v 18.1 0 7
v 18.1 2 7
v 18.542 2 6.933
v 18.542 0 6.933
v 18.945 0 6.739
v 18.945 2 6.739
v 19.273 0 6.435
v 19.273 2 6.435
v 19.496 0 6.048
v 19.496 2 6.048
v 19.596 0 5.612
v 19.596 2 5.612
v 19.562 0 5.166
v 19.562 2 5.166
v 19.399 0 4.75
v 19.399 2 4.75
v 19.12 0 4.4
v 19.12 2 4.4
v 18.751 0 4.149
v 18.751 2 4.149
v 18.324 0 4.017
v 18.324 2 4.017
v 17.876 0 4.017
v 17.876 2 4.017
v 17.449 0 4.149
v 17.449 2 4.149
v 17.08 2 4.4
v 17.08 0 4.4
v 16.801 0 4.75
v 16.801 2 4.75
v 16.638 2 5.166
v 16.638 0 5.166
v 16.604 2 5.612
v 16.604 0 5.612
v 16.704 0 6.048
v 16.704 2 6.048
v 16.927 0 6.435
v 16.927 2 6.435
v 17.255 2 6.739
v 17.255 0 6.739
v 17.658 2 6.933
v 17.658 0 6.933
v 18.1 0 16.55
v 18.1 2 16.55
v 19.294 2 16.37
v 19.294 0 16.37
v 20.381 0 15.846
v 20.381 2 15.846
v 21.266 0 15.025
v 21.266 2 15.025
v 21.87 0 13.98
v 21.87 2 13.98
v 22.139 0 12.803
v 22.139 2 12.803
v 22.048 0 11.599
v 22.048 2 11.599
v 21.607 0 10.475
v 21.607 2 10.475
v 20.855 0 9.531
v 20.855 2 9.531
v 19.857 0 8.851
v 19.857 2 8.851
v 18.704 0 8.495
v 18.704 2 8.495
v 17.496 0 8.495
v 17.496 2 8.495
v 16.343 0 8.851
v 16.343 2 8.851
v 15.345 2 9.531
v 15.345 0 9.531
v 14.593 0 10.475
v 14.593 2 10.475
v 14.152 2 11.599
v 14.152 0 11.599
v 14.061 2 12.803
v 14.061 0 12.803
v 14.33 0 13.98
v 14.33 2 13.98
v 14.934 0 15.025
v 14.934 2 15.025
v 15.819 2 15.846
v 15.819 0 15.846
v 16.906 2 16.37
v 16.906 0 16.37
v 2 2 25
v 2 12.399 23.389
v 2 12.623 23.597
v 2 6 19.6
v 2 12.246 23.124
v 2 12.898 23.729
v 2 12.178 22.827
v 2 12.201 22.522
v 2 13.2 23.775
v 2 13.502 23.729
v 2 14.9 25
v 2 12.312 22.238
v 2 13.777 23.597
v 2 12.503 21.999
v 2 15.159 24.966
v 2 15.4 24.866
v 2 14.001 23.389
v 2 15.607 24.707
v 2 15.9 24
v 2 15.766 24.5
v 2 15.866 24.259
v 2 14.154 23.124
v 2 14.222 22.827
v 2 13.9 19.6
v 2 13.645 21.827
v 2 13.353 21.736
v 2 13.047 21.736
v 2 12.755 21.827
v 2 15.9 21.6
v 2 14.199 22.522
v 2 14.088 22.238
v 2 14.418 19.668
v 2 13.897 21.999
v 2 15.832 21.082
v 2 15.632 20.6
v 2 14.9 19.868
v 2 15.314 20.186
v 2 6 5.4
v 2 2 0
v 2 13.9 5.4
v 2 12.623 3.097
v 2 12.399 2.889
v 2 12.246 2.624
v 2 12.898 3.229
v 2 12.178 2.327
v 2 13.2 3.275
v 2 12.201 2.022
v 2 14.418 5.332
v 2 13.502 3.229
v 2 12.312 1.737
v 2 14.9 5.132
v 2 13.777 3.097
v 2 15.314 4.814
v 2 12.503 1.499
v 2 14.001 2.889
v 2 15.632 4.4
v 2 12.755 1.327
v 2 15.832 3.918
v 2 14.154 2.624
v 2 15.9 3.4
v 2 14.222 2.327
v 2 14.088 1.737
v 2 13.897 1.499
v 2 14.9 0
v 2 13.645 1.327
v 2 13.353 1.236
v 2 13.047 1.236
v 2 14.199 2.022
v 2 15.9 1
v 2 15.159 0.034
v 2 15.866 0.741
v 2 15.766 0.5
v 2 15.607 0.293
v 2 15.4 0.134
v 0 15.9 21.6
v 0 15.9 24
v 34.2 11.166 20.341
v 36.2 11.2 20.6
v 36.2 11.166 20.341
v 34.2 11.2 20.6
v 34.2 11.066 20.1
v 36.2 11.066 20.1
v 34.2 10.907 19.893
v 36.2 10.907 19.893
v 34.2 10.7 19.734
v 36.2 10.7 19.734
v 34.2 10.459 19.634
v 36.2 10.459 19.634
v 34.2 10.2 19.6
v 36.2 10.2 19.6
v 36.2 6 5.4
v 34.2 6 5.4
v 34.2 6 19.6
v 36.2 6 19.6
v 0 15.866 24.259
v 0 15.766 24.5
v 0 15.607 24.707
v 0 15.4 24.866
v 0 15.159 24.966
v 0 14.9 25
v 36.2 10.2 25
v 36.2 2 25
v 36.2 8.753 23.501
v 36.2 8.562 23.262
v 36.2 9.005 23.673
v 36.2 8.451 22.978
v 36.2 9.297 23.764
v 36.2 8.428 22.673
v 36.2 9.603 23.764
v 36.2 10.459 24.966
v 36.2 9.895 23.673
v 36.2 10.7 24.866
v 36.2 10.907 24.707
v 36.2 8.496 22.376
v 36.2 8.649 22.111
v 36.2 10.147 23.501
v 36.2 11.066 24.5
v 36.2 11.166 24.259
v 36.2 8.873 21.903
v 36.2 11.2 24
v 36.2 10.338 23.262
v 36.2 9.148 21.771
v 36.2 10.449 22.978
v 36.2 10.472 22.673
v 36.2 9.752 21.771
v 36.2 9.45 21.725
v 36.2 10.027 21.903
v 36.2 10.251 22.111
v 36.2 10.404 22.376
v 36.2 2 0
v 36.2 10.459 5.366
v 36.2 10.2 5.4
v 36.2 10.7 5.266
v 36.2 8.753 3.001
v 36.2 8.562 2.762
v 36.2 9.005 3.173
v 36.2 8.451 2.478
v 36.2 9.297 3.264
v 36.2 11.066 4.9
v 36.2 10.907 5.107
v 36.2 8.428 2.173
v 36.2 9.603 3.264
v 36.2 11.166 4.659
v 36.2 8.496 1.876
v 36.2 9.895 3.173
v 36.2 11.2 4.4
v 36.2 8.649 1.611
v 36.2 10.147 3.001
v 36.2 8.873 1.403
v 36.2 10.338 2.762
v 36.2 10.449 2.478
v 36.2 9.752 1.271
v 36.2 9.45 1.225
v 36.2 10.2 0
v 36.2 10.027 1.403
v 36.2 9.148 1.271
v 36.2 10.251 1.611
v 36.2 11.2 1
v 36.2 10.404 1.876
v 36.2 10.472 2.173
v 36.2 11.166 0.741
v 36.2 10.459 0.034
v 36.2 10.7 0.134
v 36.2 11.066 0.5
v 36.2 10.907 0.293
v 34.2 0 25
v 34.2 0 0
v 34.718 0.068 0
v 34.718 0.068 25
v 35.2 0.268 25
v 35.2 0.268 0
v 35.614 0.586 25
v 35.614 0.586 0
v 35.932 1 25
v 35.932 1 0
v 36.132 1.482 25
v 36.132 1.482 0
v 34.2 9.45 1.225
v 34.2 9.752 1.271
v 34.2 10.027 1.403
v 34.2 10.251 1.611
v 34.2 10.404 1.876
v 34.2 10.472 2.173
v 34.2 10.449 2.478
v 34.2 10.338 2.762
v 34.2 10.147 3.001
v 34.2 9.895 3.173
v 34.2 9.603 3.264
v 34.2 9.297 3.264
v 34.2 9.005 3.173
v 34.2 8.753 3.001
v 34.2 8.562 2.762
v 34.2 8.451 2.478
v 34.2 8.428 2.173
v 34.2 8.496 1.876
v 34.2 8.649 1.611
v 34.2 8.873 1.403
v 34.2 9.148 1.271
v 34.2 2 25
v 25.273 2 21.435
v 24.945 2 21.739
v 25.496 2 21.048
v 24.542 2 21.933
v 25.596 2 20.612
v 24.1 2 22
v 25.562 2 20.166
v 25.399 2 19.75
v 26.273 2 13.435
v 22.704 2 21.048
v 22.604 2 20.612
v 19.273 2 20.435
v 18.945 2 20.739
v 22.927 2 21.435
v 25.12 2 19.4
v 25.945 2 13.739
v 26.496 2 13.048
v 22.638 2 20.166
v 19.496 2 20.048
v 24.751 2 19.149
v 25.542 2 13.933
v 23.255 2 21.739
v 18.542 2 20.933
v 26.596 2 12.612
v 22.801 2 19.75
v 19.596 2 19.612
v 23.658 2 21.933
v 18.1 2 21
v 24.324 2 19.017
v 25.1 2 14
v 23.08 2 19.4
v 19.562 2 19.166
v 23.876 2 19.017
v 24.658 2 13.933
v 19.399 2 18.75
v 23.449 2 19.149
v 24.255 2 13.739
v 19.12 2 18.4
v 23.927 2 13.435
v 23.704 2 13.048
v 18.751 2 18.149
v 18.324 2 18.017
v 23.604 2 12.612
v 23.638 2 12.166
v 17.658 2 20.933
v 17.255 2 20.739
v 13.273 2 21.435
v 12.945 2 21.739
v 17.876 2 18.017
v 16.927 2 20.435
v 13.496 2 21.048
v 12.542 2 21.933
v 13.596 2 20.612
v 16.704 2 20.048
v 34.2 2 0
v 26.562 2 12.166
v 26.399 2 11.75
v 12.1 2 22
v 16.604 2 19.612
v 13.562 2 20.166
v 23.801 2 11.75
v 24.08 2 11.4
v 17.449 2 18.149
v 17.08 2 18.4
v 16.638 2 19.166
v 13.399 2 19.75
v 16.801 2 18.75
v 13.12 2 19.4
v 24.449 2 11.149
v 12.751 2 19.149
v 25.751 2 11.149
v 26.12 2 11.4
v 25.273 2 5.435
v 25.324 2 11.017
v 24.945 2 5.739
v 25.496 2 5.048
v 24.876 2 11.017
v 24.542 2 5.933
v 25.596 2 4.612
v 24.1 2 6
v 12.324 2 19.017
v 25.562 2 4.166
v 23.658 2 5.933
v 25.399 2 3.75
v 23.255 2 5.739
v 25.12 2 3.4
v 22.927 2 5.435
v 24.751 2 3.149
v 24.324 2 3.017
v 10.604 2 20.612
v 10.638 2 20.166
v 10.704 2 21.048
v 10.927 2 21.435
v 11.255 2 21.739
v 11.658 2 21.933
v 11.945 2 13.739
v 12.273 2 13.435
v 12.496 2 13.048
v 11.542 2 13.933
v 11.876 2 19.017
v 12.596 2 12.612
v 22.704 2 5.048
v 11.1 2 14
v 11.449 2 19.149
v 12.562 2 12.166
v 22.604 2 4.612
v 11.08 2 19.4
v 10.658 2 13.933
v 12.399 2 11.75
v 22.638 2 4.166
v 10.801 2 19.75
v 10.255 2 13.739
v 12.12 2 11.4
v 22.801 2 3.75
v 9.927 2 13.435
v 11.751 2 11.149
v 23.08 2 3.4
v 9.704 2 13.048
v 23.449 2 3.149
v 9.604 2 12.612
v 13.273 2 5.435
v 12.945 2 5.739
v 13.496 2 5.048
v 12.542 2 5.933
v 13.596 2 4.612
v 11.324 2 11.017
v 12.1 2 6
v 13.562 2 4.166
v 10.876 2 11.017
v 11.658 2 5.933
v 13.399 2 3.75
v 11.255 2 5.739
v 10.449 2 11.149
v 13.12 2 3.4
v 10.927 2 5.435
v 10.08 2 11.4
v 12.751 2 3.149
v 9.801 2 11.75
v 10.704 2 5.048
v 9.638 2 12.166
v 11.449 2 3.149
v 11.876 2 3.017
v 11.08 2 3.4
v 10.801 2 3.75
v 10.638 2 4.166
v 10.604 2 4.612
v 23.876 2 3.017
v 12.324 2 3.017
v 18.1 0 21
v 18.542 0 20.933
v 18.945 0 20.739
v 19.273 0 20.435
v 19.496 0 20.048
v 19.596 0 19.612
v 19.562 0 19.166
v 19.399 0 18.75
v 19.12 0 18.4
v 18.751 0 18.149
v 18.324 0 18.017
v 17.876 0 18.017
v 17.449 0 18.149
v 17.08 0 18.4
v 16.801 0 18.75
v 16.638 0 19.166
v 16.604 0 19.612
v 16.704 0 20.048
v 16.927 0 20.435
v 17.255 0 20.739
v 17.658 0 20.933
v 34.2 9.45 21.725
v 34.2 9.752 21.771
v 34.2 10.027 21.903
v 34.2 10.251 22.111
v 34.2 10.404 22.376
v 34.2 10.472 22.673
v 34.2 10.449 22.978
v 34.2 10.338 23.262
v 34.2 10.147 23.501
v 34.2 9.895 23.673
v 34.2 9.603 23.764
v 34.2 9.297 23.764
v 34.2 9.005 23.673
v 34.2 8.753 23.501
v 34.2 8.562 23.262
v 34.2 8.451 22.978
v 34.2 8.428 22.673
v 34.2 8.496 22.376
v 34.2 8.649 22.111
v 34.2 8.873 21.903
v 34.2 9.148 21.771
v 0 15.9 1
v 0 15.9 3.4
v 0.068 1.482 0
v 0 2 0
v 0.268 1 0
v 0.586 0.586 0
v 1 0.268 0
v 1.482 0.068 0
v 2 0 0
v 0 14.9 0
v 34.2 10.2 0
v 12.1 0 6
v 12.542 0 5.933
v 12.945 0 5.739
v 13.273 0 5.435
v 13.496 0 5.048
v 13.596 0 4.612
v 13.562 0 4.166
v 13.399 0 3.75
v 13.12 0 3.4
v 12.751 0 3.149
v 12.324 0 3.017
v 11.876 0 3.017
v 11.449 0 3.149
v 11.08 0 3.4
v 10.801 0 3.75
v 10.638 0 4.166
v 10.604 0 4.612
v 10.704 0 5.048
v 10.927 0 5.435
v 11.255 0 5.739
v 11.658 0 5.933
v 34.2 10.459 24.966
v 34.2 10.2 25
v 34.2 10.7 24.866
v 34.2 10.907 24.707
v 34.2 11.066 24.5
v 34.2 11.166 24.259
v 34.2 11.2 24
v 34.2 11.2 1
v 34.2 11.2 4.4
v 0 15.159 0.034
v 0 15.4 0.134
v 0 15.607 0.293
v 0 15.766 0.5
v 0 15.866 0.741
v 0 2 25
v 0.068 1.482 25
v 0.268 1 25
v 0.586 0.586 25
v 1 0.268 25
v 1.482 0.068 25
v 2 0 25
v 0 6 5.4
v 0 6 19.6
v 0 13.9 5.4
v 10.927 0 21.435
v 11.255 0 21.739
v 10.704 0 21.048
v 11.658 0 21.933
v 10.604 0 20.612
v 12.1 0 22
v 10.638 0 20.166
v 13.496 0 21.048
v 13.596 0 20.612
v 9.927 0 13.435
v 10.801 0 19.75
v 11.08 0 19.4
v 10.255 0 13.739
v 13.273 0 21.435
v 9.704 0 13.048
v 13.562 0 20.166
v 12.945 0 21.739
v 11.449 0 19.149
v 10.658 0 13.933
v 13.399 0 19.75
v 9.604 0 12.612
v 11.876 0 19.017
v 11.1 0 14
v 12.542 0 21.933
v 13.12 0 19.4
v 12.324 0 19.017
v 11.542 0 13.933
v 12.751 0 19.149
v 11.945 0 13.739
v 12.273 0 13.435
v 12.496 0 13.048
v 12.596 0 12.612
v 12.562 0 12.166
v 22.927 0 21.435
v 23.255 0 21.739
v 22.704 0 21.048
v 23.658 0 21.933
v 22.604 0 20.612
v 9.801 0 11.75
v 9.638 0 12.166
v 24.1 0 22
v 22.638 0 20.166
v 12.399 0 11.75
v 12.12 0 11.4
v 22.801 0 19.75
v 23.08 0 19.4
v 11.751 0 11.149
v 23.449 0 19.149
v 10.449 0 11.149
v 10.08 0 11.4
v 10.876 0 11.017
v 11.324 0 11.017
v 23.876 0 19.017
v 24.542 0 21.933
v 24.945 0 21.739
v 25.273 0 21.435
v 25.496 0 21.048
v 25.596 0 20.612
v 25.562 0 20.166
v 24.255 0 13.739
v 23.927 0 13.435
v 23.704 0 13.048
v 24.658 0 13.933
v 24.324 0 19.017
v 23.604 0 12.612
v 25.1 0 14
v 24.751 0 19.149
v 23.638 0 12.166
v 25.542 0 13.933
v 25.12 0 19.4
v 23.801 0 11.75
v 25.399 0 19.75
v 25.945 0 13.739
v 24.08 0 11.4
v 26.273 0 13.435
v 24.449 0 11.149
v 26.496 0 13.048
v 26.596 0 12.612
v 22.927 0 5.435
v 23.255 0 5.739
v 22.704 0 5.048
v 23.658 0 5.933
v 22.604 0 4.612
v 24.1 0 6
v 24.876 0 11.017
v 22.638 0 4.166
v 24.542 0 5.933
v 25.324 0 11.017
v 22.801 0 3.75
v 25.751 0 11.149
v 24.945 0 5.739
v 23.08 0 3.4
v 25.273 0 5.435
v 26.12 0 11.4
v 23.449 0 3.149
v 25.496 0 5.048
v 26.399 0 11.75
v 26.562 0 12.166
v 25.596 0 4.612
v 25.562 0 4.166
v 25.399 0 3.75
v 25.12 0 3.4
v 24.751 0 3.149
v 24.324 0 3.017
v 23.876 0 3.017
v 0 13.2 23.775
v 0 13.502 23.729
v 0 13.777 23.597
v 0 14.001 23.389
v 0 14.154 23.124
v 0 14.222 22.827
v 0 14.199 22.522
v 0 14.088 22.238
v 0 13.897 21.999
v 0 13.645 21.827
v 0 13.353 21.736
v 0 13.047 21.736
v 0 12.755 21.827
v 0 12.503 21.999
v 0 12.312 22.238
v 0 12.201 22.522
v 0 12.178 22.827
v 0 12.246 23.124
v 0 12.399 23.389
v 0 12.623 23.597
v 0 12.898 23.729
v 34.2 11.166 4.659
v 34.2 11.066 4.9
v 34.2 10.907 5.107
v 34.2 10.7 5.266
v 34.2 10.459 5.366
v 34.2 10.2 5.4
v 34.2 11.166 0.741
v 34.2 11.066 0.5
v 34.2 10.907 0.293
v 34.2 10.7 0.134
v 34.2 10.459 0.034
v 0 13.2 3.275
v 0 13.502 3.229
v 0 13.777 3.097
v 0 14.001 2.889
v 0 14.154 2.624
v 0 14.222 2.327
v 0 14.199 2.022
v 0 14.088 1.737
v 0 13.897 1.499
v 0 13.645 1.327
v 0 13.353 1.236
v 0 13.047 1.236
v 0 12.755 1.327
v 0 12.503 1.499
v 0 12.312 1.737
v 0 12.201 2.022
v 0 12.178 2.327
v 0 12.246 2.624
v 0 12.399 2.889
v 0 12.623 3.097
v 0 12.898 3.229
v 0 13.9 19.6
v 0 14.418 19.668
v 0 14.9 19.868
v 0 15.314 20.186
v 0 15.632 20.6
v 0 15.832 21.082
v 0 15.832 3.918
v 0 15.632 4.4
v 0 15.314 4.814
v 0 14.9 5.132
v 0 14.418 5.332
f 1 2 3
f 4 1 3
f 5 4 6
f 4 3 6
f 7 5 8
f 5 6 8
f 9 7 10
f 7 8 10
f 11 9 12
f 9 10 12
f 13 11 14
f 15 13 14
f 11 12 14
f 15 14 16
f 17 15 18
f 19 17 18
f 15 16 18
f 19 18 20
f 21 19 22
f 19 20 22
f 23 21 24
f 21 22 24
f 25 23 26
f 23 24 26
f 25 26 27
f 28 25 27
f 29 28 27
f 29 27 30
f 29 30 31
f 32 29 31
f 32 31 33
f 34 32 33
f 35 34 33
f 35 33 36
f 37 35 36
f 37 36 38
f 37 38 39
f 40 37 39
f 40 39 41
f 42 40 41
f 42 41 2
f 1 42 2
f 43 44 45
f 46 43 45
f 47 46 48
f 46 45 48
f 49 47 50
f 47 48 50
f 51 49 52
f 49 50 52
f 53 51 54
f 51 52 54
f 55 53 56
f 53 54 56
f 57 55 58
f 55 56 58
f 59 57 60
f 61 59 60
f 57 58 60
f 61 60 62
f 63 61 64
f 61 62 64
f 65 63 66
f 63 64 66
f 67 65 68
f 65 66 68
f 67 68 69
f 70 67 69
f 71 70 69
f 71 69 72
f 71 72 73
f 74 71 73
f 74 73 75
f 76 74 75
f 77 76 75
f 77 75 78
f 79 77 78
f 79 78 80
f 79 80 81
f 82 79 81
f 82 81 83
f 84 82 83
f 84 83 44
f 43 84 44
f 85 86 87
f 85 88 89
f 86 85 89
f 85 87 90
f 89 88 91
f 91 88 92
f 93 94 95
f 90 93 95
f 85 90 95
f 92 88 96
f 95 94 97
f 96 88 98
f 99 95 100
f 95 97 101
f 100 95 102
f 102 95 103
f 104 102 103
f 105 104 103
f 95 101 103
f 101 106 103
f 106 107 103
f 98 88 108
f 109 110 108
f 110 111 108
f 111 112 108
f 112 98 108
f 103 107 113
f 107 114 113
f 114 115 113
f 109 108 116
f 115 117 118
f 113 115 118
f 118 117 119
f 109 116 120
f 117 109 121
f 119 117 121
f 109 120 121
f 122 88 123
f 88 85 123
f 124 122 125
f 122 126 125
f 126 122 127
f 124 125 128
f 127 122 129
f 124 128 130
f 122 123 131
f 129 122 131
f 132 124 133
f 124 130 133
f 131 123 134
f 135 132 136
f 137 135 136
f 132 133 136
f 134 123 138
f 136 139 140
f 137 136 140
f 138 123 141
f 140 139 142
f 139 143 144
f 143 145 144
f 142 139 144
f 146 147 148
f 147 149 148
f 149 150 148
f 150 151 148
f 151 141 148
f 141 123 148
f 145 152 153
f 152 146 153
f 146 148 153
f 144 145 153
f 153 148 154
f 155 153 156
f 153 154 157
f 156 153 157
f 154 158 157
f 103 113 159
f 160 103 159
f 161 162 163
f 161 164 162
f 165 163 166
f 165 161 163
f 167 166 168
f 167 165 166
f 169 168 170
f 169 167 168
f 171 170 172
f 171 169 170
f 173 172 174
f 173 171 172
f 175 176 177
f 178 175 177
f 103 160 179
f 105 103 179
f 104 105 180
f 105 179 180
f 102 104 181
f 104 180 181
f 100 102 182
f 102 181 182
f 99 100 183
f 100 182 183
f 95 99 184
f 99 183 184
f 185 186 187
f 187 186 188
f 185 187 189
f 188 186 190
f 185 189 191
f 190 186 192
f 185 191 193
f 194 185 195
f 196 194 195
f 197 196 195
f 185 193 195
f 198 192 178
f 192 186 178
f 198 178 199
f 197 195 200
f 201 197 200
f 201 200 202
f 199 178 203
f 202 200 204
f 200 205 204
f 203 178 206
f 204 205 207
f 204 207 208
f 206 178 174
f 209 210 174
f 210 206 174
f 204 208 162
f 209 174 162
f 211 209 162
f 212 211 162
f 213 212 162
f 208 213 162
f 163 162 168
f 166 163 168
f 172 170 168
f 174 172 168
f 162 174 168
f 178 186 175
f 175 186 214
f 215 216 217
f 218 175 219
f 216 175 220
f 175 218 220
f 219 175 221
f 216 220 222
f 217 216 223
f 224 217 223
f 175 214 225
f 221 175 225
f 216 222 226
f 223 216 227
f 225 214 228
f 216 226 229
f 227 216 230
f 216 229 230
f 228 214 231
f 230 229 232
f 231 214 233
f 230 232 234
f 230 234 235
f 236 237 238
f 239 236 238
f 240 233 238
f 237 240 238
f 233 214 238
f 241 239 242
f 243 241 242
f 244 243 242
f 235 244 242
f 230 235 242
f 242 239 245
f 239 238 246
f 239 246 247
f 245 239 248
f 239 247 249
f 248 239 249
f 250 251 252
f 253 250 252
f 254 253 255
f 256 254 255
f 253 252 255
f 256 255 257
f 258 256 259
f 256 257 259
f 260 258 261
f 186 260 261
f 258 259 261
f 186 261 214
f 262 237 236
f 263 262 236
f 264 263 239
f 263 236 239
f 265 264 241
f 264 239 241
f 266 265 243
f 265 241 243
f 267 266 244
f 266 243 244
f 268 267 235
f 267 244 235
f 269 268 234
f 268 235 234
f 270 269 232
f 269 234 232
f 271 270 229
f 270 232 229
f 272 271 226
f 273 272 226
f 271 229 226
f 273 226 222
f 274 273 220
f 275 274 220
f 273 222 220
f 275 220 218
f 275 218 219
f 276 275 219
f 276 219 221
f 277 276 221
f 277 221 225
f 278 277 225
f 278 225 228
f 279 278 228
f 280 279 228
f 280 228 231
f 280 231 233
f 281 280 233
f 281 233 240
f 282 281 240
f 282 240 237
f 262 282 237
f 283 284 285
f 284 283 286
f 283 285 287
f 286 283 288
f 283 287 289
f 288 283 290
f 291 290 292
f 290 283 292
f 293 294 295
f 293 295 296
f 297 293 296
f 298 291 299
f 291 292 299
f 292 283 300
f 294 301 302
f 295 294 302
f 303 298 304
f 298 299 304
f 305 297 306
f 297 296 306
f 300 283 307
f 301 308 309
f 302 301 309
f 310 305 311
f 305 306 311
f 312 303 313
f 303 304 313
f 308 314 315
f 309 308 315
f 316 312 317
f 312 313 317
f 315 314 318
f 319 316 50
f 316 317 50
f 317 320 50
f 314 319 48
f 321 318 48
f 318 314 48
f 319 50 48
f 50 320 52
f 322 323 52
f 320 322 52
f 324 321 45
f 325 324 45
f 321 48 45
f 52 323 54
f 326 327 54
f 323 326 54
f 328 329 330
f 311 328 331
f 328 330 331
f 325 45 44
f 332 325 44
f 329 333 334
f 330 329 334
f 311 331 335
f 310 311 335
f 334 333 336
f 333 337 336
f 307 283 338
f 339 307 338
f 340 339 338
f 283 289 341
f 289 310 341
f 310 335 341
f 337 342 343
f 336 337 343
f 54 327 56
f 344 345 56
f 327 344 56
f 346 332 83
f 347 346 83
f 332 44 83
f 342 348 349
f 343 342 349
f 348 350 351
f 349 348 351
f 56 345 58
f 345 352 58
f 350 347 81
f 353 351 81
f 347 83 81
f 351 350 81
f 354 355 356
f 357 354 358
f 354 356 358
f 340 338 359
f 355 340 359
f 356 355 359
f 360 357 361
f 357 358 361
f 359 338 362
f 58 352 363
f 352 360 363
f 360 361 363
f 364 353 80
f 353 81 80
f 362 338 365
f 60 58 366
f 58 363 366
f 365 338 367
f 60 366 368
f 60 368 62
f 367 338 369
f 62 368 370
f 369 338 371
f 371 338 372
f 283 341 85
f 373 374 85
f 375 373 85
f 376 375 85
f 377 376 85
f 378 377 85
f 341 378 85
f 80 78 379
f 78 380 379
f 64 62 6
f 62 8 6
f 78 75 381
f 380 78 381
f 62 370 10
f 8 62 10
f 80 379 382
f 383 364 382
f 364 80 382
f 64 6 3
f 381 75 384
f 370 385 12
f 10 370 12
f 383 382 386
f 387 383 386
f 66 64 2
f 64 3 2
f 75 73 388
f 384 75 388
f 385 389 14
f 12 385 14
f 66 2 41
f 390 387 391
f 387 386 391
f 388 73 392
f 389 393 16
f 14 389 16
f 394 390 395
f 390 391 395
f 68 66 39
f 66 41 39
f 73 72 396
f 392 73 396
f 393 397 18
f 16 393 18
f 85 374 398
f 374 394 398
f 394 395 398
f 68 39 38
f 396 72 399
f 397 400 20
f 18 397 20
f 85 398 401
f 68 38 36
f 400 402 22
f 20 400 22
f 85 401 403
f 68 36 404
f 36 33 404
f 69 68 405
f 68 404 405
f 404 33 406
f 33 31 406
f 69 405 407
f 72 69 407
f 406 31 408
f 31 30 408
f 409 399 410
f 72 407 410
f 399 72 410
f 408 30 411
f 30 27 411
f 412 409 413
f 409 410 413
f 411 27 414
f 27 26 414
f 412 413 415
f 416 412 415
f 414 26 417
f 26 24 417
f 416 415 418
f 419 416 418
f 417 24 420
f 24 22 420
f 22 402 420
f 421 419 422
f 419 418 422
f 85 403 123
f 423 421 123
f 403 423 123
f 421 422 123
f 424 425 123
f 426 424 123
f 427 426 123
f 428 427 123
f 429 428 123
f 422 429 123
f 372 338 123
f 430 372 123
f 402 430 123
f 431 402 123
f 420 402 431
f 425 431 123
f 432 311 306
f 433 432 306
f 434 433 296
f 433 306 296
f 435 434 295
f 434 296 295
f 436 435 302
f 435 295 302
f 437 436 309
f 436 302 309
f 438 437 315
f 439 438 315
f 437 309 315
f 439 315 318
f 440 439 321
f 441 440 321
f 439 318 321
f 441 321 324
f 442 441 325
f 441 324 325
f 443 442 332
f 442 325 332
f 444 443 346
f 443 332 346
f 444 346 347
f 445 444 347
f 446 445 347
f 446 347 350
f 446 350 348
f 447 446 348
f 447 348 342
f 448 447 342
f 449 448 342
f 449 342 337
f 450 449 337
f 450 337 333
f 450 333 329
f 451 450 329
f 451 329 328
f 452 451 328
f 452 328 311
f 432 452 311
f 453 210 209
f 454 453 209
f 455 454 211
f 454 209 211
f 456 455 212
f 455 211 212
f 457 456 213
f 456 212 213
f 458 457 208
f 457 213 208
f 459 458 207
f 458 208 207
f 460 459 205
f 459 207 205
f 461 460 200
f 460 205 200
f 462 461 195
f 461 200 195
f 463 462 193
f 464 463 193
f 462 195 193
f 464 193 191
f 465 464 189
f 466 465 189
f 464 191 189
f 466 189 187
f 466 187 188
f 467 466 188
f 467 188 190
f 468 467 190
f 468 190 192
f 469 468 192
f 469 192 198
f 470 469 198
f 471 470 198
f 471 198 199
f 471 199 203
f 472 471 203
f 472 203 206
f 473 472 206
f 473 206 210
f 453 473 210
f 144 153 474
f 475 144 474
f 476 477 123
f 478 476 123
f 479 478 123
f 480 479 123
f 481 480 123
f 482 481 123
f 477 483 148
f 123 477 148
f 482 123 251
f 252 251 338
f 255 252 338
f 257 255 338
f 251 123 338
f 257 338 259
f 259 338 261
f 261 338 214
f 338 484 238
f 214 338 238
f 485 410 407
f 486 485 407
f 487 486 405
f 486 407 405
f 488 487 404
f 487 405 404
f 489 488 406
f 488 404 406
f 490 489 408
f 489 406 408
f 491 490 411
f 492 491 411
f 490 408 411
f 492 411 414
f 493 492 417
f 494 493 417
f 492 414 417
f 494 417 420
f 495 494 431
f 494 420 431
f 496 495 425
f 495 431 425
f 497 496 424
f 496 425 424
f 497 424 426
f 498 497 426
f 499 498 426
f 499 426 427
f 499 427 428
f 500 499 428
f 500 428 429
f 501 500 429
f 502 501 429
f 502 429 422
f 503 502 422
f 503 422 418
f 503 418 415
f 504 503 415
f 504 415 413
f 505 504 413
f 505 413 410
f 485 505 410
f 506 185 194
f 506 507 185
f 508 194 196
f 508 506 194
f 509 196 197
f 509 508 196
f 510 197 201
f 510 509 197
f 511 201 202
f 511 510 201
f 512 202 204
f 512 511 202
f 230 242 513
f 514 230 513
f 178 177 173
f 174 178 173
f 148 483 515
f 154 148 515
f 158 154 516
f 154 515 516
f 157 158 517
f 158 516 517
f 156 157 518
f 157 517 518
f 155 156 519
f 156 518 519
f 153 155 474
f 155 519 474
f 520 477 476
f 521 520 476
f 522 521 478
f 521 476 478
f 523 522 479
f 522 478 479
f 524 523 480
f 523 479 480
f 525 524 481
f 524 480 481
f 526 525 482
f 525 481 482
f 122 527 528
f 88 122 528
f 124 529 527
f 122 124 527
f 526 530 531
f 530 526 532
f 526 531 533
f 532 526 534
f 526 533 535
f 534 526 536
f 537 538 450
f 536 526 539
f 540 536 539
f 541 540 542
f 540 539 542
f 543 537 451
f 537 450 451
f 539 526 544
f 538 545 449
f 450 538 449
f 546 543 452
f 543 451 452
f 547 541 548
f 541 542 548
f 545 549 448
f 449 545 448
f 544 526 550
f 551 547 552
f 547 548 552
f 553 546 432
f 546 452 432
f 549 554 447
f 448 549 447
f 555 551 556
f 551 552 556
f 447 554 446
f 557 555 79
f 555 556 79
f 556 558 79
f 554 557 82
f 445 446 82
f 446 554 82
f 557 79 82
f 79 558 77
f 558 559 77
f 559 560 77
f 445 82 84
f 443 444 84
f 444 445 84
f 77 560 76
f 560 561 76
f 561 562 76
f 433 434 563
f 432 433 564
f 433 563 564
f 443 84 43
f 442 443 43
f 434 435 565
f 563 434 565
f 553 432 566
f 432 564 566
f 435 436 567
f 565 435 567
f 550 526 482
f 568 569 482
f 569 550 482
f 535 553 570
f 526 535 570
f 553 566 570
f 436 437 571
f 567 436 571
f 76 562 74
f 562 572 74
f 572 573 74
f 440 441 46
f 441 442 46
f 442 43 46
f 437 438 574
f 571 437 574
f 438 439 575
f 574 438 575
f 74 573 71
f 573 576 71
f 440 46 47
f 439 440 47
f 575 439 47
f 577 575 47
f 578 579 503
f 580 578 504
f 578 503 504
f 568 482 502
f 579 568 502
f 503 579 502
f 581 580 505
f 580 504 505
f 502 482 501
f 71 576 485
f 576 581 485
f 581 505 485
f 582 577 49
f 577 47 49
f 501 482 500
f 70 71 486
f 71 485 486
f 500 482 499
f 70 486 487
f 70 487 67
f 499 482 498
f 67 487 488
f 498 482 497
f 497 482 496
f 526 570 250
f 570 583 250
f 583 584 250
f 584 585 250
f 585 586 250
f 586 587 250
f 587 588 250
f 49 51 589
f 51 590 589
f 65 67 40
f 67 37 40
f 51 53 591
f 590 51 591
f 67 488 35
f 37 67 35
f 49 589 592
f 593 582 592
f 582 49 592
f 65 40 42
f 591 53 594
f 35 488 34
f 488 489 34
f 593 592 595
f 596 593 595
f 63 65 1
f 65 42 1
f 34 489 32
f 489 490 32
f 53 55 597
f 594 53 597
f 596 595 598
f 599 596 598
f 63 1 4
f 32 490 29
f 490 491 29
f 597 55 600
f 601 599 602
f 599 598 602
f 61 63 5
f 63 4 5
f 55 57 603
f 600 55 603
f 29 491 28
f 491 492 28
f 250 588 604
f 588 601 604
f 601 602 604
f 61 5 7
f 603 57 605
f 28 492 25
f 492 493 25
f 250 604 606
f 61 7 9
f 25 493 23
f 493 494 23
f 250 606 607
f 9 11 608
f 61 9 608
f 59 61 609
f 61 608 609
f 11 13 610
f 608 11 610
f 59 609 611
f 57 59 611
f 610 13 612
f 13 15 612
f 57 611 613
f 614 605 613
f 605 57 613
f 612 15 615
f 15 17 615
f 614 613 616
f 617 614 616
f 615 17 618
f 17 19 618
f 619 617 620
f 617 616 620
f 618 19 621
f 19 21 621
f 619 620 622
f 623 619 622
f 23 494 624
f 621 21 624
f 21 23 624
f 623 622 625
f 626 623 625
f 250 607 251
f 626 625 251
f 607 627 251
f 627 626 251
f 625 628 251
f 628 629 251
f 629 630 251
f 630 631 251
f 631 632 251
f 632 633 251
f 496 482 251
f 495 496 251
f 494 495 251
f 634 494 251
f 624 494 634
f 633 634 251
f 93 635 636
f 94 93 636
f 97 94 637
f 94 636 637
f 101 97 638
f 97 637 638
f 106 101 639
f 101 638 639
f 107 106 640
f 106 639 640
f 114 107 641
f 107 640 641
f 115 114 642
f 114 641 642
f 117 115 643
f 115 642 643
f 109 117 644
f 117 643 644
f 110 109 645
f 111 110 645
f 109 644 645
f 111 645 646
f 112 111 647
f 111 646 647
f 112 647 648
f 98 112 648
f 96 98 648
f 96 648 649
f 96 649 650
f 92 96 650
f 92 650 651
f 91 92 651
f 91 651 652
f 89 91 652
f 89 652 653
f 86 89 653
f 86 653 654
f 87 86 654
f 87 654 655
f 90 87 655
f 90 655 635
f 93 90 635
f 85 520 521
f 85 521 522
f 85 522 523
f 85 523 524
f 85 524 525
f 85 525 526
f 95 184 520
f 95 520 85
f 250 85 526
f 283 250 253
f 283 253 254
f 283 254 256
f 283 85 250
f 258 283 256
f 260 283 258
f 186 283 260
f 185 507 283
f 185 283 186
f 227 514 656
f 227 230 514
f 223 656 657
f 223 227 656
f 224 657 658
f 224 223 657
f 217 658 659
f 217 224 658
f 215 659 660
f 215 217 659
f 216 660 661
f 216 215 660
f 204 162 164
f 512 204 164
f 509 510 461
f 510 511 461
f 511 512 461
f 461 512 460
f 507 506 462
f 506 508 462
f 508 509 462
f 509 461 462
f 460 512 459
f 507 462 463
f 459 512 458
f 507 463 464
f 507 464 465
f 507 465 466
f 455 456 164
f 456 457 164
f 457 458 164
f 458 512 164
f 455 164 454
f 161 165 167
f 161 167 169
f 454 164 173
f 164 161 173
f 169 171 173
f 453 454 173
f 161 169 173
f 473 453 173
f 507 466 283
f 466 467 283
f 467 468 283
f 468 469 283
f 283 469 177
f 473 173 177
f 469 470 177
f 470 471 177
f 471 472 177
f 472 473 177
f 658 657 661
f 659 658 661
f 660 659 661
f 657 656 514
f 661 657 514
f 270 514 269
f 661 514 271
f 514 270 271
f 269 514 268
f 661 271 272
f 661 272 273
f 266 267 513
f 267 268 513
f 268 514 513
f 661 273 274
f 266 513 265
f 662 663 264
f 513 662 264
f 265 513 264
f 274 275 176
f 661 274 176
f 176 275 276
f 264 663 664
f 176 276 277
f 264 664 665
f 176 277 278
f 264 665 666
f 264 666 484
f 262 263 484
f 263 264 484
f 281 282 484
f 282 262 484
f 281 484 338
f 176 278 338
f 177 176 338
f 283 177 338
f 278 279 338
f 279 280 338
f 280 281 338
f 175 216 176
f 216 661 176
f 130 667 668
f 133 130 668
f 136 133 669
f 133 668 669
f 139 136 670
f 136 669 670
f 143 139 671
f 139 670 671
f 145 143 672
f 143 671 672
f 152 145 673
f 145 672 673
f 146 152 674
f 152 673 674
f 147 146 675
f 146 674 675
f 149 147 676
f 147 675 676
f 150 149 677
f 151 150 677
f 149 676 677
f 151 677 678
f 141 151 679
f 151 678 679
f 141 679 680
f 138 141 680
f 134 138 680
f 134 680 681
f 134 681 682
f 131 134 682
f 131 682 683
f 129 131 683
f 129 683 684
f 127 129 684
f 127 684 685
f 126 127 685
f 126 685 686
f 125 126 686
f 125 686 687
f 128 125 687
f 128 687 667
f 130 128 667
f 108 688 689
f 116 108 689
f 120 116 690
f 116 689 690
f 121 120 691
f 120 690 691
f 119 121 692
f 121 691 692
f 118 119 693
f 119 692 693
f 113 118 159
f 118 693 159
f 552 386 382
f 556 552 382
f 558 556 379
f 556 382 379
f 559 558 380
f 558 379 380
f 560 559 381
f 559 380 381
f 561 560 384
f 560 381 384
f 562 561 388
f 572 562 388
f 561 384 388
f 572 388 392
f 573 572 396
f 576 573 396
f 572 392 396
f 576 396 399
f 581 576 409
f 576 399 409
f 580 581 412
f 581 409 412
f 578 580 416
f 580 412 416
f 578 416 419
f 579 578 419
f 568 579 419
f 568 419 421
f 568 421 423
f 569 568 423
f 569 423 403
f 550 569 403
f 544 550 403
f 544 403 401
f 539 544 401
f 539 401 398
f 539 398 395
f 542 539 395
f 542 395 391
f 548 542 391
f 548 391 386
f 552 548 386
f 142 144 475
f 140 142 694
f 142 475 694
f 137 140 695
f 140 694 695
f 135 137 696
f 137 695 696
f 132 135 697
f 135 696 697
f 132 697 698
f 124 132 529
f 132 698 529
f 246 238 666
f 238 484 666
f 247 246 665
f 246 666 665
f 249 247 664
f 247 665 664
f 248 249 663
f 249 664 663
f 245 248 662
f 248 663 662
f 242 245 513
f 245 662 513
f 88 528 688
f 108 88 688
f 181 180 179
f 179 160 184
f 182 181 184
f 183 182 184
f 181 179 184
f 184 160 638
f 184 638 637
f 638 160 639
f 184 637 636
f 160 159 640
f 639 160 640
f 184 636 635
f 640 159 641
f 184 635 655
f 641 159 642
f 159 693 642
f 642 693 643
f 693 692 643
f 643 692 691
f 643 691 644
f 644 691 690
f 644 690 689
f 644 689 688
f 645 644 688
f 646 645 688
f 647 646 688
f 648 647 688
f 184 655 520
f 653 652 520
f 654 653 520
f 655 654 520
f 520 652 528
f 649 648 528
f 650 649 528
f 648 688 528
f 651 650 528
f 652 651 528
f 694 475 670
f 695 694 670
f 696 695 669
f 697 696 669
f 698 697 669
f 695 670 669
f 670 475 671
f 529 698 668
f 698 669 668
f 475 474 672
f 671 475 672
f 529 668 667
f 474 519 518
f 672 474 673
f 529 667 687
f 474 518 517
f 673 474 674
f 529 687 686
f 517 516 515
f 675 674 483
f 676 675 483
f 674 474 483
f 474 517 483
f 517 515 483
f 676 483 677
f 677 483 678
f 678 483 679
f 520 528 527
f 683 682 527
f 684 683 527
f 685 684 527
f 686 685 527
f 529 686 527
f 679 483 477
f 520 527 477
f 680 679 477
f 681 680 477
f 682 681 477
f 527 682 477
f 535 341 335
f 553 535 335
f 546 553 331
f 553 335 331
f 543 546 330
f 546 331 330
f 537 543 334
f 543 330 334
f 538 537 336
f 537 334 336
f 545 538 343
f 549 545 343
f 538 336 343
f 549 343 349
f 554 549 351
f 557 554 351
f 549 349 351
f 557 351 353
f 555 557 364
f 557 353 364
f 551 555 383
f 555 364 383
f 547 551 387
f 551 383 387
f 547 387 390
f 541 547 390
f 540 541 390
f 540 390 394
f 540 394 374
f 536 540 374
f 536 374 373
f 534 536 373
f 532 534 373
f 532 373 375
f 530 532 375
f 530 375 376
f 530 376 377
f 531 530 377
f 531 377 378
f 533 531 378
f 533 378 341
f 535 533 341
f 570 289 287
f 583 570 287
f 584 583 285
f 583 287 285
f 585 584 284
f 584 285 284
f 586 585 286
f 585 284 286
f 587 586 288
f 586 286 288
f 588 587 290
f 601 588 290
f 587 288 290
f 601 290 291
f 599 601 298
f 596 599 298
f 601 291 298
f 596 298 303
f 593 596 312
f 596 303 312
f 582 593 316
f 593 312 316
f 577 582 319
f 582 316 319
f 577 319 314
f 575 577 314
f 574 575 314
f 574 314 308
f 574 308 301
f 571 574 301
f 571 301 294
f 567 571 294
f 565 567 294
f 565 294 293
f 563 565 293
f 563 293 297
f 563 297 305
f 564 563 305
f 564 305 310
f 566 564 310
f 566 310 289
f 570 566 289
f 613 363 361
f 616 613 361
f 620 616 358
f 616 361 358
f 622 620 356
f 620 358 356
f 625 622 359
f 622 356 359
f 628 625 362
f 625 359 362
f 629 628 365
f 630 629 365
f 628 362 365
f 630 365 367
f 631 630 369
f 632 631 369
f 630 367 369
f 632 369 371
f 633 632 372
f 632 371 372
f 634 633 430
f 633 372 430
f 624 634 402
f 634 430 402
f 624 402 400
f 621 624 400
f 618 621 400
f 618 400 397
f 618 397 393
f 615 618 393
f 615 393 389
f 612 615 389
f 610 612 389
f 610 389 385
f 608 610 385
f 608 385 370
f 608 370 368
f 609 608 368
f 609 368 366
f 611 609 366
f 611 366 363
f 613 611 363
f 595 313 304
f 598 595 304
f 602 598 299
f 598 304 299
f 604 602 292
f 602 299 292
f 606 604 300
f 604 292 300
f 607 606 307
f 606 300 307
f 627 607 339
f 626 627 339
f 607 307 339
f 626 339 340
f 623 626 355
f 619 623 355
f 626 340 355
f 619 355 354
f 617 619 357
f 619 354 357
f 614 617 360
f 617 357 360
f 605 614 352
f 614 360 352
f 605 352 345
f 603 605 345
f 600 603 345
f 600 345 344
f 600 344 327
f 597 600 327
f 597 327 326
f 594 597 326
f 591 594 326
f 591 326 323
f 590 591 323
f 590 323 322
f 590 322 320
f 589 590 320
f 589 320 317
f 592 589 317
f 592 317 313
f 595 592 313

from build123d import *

# Parameters (mm, degrees)
EXTRUDE_1_DEPTH     = 25
SKETCH_2_R          = 1.025
CUT_EXTRUDE_1_DEPTH = 50
FILLET_1_R          = 1
SKETCH_3_R          = 1.025
CUT_EXTRUDE_2_DEPTH = 6
SKETCH_4_R          = 4.05
SKETCH_4_R_2        = 1.5
CUT_EXTRUDE_3_DEPTH = 10


with BuildPart() as part:
    # 草图1 → 凸台-拉伸1 (new body)
    with BuildSketch(Plane.XY):
        with BuildLine():
            Line((2, 0), (34.2, 0))
            ThreePointArc((34.2, 0), (35.614213562, 0.585786438), (36.2, 2))
            Line((36.2, 2), (36.2, 11.2))
            Line((36.2, 11.2), (34.2, 11.2))
            Line((34.2, 11.2), (34.2, 2))
            Line((34.2, 2), (2, 2))
            Line((2, 2), (2, 15.9))
            Line((2, 15.9), (0, 15.9))
            Line((0, 15.9), (0, 2))
            ThreePointArc((0, 2), (0.585786438, 0.585786438), (2, 0))
        make_face()
    extrude(amount=EXTRUDE_1_DEPTH)

    # 草图2 → 切除-拉伸1 (cut)
    with BuildSketch(Plane.ZY):
        with BuildLine():
            Line((0, 15.9), (0, 14.9))
            ThreePointArc((0, 14.9), (0.292893219, 15.607106781), (1, 15.9))
            Line((1, 15.9), (0, 15.9))
        make_face()
        with Locations((2.25, 13.2)):
            Circle(SKETCH_2_R)
        with BuildLine():
            Line((21.6, 15.9), (3.4, 15.9))
            ThreePointArc((3.4, 15.9), (4.814213562, 15.314213562), (5.4, 13.9))
            Line((5.4, 13.9), (5.4, 6))
            Line((5.4, 6), (19.6, 6))
            Line((19.6, 6), (19.6, 13.9))
            ThreePointArc((19.6, 13.9), (20.185786438, 15.314213562), (21.6, 15.9))
        make_face()
        with Locations((22.75, 13.2)):
            Circle(SKETCH_2_R)
        with BuildLine():
            Line((25, 15.9), (24, 15.9))
            ThreePointArc((24, 15.9), (24.707106781, 15.607106781), (25, 14.9))
            Line((25, 14.9), (25, 15.9))
        make_face()
    extrude(amount=-CUT_EXTRUDE_1_DEPTH, mode=Mode.SUBTRACT)

    # 圆角1
    fillet_1_edges = [part.edges().sort_by_distance(p)[0] for p in [
        (35.2, 11.2, 0),
        (35.2, 11.2, 25),
        (35.2, 11.2, 19.6),
        (35.2, 11.2, 5.4),
    ]]
    fillet(fillet_1_edges, radius=FILLET_1_R)

    # 草图3 → 切除-拉伸2 (cut)
    with BuildSketch(Plane(origin=(36.2, 0, 0), x_dir=(0, 0, -1), z_dir=(1, 0, 0))):
        with Locations((-22.75, 9.45)):
            Circle(SKETCH_3_R)
        with Locations((-2.25, 9.45)):
            Circle(SKETCH_3_R)
    extrude(amount=-CUT_EXTRUDE_2_DEPTH, mode=Mode.SUBTRACT)

    # 草图4 → 切除-拉伸3 (cut)
    with BuildSketch(Plane(origin=(0, 2, 0), x_dir=(1, 0, 0), z_dir=(0, 1, 0))):
        with Locations(Location((18.1, -12.5, 0), (0, 0, 270))):
            Circle(SKETCH_4_R)
        with Locations(Location((18.1, -5.5, 0), (0, 0, 270))):
            Circle(SKETCH_4_R_2)
        with Locations(Location((25.1, -12.5, 0), (0, 0, 270))):
            Circle(SKETCH_4_R_2)
        with Locations(Location((18.1, -19.5, 0), (0, 0, 270))):
            Circle(SKETCH_4_R_2)
        with Locations(Location((11.1, -12.5, 0), (0, 0, 270))):
            Circle(SKETCH_4_R_2)
        with Locations(Location((12.1, -4.5, 0), (0, 0, 270))):
            Circle(SKETCH_4_R_2)
        with Locations(Location((24.1, -4.5, 0), (0, 0, 270))):
            Circle(SKETCH_4_R_2)
        with Locations(Location((24.1, -20.5, 0), (0, 0, 270))):
            Circle(SKETCH_4_R_2)
        with Locations(Location((12.1, -20.5, 0), (0, 0, 270))):
            Circle(SKETCH_4_R_2)
    extrude(amount=-CUT_EXTRUDE_3_DEPTH, mode=Mode.SUBTRACT)


solid = part.part
